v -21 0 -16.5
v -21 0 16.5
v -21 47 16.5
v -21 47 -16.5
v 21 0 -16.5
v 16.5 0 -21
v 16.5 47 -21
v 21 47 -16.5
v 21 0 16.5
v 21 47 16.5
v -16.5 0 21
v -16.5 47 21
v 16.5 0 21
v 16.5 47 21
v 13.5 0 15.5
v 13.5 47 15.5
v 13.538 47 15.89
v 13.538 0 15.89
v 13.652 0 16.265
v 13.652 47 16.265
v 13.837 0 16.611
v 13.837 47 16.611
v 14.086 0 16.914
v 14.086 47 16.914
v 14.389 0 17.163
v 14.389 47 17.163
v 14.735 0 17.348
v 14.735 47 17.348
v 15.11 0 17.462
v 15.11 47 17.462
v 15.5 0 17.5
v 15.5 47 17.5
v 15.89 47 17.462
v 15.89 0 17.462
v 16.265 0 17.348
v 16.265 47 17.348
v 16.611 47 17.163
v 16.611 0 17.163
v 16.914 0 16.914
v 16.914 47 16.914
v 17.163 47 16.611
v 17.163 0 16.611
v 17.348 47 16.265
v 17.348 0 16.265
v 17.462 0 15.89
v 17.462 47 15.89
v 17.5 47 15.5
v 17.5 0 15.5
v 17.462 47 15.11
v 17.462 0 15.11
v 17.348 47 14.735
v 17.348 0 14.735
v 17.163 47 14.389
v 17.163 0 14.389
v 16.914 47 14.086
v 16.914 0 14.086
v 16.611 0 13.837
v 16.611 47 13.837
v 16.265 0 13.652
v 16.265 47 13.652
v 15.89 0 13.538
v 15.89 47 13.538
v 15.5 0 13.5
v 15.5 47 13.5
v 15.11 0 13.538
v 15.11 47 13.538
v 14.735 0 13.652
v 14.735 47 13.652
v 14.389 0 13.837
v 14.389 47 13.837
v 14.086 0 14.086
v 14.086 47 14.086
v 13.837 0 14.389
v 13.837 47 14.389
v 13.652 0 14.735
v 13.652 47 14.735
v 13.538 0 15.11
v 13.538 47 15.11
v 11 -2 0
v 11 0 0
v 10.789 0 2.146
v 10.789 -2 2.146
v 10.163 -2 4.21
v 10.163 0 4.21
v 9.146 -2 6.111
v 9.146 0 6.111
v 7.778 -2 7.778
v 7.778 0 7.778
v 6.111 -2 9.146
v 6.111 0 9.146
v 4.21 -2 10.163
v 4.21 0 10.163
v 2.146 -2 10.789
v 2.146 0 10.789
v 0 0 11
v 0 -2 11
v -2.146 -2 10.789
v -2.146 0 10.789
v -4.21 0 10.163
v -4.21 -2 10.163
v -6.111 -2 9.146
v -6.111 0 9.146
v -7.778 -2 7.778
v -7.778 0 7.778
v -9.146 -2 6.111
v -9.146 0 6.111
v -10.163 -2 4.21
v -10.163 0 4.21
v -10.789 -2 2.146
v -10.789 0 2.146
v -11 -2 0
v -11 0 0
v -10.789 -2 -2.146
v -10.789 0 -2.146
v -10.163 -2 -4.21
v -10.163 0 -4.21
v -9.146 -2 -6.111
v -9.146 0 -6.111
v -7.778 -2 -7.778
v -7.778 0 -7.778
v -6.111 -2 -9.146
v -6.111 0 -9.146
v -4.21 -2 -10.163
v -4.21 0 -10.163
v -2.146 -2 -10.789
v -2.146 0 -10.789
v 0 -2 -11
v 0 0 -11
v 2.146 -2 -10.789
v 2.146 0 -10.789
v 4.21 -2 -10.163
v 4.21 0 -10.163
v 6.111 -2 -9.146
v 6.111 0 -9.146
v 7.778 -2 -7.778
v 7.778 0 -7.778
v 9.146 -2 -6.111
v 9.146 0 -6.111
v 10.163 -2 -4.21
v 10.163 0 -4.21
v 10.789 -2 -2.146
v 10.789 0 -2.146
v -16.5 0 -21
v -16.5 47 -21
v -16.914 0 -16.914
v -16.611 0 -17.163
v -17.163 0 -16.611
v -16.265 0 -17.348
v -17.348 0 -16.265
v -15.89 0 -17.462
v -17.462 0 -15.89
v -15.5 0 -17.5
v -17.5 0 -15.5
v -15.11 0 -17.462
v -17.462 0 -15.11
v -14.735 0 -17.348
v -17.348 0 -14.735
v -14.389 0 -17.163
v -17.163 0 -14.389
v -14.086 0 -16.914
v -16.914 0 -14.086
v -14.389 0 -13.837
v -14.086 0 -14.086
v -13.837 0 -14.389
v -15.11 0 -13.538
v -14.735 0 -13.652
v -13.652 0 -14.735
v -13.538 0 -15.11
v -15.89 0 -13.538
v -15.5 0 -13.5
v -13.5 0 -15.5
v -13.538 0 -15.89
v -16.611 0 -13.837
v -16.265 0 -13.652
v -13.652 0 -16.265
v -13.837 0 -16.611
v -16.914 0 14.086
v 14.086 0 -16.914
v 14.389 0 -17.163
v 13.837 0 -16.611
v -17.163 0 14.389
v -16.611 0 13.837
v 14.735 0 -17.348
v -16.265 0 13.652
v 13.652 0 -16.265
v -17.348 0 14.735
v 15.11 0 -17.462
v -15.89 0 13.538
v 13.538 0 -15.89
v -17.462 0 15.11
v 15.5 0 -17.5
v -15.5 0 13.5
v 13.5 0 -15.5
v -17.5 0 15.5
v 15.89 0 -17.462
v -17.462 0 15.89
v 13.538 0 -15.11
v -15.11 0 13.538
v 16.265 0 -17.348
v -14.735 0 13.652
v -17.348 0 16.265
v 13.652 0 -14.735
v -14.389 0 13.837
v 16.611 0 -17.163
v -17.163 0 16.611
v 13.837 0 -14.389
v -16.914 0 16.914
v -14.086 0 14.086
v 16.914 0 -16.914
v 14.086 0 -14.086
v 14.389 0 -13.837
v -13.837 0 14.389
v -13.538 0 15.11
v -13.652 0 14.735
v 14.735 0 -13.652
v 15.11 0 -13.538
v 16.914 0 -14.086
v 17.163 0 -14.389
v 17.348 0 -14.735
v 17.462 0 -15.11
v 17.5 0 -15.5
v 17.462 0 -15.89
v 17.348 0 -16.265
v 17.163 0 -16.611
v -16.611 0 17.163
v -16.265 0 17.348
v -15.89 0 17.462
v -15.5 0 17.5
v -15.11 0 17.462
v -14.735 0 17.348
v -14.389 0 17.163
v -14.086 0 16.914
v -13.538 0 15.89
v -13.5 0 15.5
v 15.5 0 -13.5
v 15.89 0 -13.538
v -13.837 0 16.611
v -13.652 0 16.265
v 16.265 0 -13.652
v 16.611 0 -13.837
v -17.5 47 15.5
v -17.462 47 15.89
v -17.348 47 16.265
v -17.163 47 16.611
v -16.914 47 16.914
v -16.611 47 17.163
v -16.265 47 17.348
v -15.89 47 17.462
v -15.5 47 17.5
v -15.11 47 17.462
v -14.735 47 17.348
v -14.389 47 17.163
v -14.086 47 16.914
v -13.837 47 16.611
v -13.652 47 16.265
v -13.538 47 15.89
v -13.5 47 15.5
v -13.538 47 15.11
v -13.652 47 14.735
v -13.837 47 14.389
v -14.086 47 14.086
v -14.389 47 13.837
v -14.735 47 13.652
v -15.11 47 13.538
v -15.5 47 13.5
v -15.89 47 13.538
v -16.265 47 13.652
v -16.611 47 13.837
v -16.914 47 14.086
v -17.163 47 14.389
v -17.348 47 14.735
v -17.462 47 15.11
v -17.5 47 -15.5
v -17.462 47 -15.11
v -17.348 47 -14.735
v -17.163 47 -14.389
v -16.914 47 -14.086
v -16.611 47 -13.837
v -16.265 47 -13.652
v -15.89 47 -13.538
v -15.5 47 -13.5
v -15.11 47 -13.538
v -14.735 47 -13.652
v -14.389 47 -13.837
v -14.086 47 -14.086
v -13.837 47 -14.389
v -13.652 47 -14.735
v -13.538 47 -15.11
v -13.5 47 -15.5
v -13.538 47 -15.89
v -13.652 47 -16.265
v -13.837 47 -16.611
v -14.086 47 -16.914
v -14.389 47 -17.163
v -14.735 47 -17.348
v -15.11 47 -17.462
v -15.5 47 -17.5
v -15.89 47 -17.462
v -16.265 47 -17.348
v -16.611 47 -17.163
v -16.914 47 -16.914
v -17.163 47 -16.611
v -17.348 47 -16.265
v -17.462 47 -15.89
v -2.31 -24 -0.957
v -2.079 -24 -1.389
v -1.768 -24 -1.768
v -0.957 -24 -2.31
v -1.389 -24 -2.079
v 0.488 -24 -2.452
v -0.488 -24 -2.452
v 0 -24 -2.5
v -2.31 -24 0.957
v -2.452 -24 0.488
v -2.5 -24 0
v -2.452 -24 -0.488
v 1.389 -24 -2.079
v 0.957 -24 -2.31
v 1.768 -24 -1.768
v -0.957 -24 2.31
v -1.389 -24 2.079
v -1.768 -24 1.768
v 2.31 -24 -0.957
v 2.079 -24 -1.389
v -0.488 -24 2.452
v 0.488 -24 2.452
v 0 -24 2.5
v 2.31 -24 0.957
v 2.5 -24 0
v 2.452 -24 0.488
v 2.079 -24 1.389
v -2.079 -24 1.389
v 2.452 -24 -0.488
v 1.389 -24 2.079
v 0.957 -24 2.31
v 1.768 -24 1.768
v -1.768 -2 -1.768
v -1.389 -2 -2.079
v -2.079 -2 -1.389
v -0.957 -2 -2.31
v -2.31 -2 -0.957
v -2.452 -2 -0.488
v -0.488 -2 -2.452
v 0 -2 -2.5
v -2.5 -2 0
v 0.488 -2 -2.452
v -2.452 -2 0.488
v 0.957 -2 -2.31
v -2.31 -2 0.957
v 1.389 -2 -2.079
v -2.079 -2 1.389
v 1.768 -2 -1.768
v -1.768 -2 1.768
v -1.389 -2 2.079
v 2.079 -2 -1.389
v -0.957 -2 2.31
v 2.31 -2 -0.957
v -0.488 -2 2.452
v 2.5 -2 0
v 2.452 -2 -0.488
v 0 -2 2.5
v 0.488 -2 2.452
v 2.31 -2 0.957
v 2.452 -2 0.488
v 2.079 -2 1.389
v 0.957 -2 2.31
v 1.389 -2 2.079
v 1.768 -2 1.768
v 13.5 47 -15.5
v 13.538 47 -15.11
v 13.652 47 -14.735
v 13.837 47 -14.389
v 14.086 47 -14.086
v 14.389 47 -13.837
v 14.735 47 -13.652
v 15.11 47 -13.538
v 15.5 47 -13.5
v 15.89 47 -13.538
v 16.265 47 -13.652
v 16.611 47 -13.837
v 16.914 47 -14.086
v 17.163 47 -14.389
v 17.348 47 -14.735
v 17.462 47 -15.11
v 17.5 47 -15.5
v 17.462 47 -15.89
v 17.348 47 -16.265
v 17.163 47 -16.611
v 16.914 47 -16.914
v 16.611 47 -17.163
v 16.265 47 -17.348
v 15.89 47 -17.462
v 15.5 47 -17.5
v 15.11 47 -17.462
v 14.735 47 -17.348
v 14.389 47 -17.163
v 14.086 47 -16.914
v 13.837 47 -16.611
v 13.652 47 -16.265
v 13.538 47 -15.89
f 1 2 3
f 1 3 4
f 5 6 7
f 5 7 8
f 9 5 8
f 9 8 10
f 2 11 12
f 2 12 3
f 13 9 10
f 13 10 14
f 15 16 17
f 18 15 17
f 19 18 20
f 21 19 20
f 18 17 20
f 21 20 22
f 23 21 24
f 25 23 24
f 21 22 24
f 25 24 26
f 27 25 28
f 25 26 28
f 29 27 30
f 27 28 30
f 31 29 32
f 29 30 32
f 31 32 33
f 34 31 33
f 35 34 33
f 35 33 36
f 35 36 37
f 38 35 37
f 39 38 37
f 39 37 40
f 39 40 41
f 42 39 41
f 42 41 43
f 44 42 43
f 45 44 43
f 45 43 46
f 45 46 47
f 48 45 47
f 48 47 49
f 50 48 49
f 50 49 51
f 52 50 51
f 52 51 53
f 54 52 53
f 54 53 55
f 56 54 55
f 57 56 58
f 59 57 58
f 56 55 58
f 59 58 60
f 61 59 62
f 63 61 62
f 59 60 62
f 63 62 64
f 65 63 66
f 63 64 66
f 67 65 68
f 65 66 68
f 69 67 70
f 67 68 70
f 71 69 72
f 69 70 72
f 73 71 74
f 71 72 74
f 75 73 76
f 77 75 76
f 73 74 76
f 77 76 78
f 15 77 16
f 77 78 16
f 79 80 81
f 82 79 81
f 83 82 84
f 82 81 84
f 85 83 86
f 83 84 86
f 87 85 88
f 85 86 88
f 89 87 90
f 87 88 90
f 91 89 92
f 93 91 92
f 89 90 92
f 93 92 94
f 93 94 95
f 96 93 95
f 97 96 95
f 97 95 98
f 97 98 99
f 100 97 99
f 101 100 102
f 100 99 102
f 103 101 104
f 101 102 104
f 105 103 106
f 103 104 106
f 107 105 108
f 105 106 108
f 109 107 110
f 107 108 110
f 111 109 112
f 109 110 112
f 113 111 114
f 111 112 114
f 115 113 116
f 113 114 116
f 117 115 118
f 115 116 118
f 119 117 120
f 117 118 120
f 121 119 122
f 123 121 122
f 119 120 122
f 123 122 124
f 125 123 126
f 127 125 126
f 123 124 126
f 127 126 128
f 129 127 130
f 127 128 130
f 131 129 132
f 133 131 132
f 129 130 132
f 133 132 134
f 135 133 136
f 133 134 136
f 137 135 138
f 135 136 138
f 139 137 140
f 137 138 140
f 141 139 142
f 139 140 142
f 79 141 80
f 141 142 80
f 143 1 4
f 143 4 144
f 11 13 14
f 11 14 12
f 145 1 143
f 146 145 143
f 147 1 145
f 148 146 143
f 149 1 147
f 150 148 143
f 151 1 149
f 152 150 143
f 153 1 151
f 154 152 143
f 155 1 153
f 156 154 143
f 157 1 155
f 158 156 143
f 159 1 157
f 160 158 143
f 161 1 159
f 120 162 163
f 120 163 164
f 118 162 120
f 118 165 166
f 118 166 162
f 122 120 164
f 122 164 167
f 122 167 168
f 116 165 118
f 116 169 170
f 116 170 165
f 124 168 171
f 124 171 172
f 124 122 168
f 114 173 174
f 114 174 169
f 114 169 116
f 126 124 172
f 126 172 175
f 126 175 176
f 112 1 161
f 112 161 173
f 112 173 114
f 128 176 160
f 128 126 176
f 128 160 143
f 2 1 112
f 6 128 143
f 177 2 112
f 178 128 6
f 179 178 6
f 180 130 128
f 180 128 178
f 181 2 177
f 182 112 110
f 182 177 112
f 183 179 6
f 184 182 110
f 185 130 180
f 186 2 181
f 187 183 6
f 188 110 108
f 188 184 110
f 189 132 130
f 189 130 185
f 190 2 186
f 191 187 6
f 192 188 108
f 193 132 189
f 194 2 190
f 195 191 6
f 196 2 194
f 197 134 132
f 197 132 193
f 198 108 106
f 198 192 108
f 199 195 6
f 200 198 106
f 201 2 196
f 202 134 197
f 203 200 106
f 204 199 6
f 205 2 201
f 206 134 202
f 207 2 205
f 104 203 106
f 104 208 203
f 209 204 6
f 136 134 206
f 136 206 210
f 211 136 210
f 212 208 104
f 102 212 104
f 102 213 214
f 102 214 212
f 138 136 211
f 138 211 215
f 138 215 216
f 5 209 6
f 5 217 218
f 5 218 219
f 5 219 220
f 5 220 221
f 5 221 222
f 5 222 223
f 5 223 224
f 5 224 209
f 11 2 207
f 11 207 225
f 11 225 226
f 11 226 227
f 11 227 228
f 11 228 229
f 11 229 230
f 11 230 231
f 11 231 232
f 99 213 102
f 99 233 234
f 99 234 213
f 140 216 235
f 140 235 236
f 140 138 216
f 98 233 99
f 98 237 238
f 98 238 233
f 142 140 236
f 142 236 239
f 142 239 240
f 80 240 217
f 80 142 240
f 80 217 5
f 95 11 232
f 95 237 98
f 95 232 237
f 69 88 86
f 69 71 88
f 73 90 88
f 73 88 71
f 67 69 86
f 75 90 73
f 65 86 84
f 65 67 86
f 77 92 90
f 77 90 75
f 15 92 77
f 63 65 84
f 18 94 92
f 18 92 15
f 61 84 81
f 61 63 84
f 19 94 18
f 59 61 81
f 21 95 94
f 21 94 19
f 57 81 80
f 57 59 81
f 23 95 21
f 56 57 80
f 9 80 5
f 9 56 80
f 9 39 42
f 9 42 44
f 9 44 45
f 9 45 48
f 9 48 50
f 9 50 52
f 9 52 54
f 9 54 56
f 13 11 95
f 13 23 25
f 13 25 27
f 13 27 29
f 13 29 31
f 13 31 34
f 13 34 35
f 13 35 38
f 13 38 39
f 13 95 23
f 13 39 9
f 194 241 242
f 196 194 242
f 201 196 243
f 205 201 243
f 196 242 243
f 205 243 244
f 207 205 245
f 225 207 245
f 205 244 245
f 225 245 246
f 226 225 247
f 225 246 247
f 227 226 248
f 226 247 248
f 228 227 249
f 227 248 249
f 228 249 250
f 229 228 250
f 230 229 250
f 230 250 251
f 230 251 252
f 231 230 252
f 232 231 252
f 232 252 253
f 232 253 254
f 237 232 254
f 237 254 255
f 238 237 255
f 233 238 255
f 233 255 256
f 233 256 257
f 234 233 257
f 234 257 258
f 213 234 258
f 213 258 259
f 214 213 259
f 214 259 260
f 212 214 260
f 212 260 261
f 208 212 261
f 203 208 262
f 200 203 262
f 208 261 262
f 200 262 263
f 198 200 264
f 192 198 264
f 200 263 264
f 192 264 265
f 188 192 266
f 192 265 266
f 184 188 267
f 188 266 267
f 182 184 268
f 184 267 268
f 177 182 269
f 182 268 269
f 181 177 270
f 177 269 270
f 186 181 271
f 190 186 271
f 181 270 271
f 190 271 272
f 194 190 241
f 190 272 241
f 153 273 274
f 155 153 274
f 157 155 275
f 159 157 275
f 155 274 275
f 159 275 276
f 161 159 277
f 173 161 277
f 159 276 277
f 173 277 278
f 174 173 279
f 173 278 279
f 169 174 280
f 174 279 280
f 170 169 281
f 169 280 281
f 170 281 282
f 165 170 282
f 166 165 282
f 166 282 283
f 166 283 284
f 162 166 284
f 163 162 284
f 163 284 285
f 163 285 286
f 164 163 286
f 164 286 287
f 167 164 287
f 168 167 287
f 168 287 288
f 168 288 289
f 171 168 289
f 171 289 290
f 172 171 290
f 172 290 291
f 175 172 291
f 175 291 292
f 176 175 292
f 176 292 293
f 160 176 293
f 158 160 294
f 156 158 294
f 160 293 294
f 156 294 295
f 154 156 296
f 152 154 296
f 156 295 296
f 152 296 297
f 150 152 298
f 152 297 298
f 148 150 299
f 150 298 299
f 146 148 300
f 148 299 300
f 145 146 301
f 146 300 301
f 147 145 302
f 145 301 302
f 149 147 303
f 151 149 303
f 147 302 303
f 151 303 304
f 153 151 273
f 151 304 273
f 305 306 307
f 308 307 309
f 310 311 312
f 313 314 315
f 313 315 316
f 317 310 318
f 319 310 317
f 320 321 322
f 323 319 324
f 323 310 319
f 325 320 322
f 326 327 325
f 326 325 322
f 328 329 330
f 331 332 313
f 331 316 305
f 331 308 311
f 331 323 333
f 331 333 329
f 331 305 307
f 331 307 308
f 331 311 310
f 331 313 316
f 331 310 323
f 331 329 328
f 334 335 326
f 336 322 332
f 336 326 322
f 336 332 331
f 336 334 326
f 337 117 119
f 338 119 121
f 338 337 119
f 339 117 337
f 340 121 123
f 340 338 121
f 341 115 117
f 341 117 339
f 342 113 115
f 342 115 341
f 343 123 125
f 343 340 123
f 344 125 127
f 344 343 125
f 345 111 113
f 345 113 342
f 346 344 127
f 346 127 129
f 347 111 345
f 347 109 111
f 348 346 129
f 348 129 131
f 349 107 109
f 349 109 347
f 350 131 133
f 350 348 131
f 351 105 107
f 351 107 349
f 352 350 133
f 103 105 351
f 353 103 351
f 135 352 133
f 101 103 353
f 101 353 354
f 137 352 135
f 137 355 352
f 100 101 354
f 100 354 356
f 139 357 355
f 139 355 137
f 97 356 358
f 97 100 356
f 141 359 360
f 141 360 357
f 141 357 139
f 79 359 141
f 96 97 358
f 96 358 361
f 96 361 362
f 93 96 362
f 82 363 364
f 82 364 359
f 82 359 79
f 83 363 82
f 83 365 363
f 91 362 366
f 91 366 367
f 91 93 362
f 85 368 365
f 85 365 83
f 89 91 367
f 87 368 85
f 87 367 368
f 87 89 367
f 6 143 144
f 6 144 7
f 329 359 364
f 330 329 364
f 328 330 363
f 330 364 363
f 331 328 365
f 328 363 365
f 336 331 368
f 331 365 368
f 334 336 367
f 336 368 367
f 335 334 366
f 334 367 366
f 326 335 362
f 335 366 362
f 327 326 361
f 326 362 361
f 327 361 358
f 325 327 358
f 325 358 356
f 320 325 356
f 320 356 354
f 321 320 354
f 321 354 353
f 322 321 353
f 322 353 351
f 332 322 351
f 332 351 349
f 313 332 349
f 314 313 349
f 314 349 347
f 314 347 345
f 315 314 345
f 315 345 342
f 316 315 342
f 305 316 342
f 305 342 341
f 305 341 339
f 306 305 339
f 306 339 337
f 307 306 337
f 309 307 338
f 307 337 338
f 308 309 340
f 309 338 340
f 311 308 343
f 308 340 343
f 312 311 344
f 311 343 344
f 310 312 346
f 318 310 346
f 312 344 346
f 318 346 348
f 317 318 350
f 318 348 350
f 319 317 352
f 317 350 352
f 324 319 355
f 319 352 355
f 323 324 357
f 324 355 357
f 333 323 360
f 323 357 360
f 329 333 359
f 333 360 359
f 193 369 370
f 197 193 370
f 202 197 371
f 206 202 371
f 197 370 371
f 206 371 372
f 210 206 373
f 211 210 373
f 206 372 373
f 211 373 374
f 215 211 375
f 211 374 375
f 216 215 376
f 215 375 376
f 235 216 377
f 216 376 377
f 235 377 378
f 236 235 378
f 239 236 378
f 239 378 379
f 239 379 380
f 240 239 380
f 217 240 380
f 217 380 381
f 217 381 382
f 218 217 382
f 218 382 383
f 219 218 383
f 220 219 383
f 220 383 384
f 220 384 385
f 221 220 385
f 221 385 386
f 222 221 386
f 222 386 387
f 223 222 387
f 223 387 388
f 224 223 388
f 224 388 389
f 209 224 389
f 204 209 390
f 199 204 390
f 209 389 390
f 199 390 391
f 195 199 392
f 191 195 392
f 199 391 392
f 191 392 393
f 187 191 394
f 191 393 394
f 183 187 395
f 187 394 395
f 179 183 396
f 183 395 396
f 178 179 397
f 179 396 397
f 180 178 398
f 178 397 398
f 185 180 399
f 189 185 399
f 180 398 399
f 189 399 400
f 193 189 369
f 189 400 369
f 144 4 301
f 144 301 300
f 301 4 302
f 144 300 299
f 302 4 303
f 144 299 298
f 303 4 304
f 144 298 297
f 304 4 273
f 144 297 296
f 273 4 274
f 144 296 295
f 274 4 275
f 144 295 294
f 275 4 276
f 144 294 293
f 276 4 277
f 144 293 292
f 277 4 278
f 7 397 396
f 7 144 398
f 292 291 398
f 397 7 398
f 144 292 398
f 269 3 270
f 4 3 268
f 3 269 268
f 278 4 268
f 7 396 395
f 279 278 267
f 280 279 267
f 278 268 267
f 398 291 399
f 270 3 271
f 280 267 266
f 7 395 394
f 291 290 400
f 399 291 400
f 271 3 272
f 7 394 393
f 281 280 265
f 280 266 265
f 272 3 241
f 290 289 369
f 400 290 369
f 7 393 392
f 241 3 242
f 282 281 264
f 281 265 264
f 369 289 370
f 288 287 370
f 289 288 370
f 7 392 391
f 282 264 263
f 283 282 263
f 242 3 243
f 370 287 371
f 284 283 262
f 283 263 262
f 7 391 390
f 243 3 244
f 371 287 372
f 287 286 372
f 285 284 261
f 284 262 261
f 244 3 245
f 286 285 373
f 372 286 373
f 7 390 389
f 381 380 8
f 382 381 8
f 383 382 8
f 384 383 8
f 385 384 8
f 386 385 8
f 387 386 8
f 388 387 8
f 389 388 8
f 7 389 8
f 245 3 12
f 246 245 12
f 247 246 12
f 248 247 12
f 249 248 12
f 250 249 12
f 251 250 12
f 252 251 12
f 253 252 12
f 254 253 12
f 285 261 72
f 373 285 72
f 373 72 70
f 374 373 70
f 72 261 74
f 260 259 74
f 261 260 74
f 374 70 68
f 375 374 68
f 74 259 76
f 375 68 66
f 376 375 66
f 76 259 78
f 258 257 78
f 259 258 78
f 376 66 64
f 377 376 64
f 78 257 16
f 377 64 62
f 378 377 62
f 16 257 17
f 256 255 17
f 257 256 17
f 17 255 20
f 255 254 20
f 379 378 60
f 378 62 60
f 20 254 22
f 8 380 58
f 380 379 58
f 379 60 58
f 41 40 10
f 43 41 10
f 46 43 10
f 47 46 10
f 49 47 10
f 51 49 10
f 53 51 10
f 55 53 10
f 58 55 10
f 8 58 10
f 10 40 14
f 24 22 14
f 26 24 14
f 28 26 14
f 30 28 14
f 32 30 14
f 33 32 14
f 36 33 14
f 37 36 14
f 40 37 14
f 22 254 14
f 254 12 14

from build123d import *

# Parameters (mm, degrees)
F0_R     = 2.5
F3_DEPTH = 24
F1_R     = 11
F4_DEPTH = 2
F5_DEPTH = 47
F7_D     = 4


with BuildPart() as f3:
    # F0 (on Front) → F3 (new body)
    with BuildSketch(Plane.XZ):
        Circle(F0_R)
    extrude(amount=F3_DEPTH)

    # F1 (on Front) → F4 (join)
    with BuildSketch(Plane.XZ):
        Circle(F1_R)
    extrude(amount=F4_DEPTH)

    # F2 (on Front) → F5 (join)
    with BuildSketch(Plane.XZ):
        Polygon((21, 16.5), (16.5, 21), (-16.5, 21), (-21, 16.5), (-21, -16.5), (-16.5, -21), (16.5, -21), (21, -16.5), align=None)
    extrude(amount=-F5_DEPTH)

    # F7 (through all)
    with Locations(Plane.XZ):
        with Locations((-15.5, 15.5), (15.5, 15.5), (15.5, -15.5), (-15.5, -15.5)):
            Hole(F7_D / 2)


solid = f3.part
